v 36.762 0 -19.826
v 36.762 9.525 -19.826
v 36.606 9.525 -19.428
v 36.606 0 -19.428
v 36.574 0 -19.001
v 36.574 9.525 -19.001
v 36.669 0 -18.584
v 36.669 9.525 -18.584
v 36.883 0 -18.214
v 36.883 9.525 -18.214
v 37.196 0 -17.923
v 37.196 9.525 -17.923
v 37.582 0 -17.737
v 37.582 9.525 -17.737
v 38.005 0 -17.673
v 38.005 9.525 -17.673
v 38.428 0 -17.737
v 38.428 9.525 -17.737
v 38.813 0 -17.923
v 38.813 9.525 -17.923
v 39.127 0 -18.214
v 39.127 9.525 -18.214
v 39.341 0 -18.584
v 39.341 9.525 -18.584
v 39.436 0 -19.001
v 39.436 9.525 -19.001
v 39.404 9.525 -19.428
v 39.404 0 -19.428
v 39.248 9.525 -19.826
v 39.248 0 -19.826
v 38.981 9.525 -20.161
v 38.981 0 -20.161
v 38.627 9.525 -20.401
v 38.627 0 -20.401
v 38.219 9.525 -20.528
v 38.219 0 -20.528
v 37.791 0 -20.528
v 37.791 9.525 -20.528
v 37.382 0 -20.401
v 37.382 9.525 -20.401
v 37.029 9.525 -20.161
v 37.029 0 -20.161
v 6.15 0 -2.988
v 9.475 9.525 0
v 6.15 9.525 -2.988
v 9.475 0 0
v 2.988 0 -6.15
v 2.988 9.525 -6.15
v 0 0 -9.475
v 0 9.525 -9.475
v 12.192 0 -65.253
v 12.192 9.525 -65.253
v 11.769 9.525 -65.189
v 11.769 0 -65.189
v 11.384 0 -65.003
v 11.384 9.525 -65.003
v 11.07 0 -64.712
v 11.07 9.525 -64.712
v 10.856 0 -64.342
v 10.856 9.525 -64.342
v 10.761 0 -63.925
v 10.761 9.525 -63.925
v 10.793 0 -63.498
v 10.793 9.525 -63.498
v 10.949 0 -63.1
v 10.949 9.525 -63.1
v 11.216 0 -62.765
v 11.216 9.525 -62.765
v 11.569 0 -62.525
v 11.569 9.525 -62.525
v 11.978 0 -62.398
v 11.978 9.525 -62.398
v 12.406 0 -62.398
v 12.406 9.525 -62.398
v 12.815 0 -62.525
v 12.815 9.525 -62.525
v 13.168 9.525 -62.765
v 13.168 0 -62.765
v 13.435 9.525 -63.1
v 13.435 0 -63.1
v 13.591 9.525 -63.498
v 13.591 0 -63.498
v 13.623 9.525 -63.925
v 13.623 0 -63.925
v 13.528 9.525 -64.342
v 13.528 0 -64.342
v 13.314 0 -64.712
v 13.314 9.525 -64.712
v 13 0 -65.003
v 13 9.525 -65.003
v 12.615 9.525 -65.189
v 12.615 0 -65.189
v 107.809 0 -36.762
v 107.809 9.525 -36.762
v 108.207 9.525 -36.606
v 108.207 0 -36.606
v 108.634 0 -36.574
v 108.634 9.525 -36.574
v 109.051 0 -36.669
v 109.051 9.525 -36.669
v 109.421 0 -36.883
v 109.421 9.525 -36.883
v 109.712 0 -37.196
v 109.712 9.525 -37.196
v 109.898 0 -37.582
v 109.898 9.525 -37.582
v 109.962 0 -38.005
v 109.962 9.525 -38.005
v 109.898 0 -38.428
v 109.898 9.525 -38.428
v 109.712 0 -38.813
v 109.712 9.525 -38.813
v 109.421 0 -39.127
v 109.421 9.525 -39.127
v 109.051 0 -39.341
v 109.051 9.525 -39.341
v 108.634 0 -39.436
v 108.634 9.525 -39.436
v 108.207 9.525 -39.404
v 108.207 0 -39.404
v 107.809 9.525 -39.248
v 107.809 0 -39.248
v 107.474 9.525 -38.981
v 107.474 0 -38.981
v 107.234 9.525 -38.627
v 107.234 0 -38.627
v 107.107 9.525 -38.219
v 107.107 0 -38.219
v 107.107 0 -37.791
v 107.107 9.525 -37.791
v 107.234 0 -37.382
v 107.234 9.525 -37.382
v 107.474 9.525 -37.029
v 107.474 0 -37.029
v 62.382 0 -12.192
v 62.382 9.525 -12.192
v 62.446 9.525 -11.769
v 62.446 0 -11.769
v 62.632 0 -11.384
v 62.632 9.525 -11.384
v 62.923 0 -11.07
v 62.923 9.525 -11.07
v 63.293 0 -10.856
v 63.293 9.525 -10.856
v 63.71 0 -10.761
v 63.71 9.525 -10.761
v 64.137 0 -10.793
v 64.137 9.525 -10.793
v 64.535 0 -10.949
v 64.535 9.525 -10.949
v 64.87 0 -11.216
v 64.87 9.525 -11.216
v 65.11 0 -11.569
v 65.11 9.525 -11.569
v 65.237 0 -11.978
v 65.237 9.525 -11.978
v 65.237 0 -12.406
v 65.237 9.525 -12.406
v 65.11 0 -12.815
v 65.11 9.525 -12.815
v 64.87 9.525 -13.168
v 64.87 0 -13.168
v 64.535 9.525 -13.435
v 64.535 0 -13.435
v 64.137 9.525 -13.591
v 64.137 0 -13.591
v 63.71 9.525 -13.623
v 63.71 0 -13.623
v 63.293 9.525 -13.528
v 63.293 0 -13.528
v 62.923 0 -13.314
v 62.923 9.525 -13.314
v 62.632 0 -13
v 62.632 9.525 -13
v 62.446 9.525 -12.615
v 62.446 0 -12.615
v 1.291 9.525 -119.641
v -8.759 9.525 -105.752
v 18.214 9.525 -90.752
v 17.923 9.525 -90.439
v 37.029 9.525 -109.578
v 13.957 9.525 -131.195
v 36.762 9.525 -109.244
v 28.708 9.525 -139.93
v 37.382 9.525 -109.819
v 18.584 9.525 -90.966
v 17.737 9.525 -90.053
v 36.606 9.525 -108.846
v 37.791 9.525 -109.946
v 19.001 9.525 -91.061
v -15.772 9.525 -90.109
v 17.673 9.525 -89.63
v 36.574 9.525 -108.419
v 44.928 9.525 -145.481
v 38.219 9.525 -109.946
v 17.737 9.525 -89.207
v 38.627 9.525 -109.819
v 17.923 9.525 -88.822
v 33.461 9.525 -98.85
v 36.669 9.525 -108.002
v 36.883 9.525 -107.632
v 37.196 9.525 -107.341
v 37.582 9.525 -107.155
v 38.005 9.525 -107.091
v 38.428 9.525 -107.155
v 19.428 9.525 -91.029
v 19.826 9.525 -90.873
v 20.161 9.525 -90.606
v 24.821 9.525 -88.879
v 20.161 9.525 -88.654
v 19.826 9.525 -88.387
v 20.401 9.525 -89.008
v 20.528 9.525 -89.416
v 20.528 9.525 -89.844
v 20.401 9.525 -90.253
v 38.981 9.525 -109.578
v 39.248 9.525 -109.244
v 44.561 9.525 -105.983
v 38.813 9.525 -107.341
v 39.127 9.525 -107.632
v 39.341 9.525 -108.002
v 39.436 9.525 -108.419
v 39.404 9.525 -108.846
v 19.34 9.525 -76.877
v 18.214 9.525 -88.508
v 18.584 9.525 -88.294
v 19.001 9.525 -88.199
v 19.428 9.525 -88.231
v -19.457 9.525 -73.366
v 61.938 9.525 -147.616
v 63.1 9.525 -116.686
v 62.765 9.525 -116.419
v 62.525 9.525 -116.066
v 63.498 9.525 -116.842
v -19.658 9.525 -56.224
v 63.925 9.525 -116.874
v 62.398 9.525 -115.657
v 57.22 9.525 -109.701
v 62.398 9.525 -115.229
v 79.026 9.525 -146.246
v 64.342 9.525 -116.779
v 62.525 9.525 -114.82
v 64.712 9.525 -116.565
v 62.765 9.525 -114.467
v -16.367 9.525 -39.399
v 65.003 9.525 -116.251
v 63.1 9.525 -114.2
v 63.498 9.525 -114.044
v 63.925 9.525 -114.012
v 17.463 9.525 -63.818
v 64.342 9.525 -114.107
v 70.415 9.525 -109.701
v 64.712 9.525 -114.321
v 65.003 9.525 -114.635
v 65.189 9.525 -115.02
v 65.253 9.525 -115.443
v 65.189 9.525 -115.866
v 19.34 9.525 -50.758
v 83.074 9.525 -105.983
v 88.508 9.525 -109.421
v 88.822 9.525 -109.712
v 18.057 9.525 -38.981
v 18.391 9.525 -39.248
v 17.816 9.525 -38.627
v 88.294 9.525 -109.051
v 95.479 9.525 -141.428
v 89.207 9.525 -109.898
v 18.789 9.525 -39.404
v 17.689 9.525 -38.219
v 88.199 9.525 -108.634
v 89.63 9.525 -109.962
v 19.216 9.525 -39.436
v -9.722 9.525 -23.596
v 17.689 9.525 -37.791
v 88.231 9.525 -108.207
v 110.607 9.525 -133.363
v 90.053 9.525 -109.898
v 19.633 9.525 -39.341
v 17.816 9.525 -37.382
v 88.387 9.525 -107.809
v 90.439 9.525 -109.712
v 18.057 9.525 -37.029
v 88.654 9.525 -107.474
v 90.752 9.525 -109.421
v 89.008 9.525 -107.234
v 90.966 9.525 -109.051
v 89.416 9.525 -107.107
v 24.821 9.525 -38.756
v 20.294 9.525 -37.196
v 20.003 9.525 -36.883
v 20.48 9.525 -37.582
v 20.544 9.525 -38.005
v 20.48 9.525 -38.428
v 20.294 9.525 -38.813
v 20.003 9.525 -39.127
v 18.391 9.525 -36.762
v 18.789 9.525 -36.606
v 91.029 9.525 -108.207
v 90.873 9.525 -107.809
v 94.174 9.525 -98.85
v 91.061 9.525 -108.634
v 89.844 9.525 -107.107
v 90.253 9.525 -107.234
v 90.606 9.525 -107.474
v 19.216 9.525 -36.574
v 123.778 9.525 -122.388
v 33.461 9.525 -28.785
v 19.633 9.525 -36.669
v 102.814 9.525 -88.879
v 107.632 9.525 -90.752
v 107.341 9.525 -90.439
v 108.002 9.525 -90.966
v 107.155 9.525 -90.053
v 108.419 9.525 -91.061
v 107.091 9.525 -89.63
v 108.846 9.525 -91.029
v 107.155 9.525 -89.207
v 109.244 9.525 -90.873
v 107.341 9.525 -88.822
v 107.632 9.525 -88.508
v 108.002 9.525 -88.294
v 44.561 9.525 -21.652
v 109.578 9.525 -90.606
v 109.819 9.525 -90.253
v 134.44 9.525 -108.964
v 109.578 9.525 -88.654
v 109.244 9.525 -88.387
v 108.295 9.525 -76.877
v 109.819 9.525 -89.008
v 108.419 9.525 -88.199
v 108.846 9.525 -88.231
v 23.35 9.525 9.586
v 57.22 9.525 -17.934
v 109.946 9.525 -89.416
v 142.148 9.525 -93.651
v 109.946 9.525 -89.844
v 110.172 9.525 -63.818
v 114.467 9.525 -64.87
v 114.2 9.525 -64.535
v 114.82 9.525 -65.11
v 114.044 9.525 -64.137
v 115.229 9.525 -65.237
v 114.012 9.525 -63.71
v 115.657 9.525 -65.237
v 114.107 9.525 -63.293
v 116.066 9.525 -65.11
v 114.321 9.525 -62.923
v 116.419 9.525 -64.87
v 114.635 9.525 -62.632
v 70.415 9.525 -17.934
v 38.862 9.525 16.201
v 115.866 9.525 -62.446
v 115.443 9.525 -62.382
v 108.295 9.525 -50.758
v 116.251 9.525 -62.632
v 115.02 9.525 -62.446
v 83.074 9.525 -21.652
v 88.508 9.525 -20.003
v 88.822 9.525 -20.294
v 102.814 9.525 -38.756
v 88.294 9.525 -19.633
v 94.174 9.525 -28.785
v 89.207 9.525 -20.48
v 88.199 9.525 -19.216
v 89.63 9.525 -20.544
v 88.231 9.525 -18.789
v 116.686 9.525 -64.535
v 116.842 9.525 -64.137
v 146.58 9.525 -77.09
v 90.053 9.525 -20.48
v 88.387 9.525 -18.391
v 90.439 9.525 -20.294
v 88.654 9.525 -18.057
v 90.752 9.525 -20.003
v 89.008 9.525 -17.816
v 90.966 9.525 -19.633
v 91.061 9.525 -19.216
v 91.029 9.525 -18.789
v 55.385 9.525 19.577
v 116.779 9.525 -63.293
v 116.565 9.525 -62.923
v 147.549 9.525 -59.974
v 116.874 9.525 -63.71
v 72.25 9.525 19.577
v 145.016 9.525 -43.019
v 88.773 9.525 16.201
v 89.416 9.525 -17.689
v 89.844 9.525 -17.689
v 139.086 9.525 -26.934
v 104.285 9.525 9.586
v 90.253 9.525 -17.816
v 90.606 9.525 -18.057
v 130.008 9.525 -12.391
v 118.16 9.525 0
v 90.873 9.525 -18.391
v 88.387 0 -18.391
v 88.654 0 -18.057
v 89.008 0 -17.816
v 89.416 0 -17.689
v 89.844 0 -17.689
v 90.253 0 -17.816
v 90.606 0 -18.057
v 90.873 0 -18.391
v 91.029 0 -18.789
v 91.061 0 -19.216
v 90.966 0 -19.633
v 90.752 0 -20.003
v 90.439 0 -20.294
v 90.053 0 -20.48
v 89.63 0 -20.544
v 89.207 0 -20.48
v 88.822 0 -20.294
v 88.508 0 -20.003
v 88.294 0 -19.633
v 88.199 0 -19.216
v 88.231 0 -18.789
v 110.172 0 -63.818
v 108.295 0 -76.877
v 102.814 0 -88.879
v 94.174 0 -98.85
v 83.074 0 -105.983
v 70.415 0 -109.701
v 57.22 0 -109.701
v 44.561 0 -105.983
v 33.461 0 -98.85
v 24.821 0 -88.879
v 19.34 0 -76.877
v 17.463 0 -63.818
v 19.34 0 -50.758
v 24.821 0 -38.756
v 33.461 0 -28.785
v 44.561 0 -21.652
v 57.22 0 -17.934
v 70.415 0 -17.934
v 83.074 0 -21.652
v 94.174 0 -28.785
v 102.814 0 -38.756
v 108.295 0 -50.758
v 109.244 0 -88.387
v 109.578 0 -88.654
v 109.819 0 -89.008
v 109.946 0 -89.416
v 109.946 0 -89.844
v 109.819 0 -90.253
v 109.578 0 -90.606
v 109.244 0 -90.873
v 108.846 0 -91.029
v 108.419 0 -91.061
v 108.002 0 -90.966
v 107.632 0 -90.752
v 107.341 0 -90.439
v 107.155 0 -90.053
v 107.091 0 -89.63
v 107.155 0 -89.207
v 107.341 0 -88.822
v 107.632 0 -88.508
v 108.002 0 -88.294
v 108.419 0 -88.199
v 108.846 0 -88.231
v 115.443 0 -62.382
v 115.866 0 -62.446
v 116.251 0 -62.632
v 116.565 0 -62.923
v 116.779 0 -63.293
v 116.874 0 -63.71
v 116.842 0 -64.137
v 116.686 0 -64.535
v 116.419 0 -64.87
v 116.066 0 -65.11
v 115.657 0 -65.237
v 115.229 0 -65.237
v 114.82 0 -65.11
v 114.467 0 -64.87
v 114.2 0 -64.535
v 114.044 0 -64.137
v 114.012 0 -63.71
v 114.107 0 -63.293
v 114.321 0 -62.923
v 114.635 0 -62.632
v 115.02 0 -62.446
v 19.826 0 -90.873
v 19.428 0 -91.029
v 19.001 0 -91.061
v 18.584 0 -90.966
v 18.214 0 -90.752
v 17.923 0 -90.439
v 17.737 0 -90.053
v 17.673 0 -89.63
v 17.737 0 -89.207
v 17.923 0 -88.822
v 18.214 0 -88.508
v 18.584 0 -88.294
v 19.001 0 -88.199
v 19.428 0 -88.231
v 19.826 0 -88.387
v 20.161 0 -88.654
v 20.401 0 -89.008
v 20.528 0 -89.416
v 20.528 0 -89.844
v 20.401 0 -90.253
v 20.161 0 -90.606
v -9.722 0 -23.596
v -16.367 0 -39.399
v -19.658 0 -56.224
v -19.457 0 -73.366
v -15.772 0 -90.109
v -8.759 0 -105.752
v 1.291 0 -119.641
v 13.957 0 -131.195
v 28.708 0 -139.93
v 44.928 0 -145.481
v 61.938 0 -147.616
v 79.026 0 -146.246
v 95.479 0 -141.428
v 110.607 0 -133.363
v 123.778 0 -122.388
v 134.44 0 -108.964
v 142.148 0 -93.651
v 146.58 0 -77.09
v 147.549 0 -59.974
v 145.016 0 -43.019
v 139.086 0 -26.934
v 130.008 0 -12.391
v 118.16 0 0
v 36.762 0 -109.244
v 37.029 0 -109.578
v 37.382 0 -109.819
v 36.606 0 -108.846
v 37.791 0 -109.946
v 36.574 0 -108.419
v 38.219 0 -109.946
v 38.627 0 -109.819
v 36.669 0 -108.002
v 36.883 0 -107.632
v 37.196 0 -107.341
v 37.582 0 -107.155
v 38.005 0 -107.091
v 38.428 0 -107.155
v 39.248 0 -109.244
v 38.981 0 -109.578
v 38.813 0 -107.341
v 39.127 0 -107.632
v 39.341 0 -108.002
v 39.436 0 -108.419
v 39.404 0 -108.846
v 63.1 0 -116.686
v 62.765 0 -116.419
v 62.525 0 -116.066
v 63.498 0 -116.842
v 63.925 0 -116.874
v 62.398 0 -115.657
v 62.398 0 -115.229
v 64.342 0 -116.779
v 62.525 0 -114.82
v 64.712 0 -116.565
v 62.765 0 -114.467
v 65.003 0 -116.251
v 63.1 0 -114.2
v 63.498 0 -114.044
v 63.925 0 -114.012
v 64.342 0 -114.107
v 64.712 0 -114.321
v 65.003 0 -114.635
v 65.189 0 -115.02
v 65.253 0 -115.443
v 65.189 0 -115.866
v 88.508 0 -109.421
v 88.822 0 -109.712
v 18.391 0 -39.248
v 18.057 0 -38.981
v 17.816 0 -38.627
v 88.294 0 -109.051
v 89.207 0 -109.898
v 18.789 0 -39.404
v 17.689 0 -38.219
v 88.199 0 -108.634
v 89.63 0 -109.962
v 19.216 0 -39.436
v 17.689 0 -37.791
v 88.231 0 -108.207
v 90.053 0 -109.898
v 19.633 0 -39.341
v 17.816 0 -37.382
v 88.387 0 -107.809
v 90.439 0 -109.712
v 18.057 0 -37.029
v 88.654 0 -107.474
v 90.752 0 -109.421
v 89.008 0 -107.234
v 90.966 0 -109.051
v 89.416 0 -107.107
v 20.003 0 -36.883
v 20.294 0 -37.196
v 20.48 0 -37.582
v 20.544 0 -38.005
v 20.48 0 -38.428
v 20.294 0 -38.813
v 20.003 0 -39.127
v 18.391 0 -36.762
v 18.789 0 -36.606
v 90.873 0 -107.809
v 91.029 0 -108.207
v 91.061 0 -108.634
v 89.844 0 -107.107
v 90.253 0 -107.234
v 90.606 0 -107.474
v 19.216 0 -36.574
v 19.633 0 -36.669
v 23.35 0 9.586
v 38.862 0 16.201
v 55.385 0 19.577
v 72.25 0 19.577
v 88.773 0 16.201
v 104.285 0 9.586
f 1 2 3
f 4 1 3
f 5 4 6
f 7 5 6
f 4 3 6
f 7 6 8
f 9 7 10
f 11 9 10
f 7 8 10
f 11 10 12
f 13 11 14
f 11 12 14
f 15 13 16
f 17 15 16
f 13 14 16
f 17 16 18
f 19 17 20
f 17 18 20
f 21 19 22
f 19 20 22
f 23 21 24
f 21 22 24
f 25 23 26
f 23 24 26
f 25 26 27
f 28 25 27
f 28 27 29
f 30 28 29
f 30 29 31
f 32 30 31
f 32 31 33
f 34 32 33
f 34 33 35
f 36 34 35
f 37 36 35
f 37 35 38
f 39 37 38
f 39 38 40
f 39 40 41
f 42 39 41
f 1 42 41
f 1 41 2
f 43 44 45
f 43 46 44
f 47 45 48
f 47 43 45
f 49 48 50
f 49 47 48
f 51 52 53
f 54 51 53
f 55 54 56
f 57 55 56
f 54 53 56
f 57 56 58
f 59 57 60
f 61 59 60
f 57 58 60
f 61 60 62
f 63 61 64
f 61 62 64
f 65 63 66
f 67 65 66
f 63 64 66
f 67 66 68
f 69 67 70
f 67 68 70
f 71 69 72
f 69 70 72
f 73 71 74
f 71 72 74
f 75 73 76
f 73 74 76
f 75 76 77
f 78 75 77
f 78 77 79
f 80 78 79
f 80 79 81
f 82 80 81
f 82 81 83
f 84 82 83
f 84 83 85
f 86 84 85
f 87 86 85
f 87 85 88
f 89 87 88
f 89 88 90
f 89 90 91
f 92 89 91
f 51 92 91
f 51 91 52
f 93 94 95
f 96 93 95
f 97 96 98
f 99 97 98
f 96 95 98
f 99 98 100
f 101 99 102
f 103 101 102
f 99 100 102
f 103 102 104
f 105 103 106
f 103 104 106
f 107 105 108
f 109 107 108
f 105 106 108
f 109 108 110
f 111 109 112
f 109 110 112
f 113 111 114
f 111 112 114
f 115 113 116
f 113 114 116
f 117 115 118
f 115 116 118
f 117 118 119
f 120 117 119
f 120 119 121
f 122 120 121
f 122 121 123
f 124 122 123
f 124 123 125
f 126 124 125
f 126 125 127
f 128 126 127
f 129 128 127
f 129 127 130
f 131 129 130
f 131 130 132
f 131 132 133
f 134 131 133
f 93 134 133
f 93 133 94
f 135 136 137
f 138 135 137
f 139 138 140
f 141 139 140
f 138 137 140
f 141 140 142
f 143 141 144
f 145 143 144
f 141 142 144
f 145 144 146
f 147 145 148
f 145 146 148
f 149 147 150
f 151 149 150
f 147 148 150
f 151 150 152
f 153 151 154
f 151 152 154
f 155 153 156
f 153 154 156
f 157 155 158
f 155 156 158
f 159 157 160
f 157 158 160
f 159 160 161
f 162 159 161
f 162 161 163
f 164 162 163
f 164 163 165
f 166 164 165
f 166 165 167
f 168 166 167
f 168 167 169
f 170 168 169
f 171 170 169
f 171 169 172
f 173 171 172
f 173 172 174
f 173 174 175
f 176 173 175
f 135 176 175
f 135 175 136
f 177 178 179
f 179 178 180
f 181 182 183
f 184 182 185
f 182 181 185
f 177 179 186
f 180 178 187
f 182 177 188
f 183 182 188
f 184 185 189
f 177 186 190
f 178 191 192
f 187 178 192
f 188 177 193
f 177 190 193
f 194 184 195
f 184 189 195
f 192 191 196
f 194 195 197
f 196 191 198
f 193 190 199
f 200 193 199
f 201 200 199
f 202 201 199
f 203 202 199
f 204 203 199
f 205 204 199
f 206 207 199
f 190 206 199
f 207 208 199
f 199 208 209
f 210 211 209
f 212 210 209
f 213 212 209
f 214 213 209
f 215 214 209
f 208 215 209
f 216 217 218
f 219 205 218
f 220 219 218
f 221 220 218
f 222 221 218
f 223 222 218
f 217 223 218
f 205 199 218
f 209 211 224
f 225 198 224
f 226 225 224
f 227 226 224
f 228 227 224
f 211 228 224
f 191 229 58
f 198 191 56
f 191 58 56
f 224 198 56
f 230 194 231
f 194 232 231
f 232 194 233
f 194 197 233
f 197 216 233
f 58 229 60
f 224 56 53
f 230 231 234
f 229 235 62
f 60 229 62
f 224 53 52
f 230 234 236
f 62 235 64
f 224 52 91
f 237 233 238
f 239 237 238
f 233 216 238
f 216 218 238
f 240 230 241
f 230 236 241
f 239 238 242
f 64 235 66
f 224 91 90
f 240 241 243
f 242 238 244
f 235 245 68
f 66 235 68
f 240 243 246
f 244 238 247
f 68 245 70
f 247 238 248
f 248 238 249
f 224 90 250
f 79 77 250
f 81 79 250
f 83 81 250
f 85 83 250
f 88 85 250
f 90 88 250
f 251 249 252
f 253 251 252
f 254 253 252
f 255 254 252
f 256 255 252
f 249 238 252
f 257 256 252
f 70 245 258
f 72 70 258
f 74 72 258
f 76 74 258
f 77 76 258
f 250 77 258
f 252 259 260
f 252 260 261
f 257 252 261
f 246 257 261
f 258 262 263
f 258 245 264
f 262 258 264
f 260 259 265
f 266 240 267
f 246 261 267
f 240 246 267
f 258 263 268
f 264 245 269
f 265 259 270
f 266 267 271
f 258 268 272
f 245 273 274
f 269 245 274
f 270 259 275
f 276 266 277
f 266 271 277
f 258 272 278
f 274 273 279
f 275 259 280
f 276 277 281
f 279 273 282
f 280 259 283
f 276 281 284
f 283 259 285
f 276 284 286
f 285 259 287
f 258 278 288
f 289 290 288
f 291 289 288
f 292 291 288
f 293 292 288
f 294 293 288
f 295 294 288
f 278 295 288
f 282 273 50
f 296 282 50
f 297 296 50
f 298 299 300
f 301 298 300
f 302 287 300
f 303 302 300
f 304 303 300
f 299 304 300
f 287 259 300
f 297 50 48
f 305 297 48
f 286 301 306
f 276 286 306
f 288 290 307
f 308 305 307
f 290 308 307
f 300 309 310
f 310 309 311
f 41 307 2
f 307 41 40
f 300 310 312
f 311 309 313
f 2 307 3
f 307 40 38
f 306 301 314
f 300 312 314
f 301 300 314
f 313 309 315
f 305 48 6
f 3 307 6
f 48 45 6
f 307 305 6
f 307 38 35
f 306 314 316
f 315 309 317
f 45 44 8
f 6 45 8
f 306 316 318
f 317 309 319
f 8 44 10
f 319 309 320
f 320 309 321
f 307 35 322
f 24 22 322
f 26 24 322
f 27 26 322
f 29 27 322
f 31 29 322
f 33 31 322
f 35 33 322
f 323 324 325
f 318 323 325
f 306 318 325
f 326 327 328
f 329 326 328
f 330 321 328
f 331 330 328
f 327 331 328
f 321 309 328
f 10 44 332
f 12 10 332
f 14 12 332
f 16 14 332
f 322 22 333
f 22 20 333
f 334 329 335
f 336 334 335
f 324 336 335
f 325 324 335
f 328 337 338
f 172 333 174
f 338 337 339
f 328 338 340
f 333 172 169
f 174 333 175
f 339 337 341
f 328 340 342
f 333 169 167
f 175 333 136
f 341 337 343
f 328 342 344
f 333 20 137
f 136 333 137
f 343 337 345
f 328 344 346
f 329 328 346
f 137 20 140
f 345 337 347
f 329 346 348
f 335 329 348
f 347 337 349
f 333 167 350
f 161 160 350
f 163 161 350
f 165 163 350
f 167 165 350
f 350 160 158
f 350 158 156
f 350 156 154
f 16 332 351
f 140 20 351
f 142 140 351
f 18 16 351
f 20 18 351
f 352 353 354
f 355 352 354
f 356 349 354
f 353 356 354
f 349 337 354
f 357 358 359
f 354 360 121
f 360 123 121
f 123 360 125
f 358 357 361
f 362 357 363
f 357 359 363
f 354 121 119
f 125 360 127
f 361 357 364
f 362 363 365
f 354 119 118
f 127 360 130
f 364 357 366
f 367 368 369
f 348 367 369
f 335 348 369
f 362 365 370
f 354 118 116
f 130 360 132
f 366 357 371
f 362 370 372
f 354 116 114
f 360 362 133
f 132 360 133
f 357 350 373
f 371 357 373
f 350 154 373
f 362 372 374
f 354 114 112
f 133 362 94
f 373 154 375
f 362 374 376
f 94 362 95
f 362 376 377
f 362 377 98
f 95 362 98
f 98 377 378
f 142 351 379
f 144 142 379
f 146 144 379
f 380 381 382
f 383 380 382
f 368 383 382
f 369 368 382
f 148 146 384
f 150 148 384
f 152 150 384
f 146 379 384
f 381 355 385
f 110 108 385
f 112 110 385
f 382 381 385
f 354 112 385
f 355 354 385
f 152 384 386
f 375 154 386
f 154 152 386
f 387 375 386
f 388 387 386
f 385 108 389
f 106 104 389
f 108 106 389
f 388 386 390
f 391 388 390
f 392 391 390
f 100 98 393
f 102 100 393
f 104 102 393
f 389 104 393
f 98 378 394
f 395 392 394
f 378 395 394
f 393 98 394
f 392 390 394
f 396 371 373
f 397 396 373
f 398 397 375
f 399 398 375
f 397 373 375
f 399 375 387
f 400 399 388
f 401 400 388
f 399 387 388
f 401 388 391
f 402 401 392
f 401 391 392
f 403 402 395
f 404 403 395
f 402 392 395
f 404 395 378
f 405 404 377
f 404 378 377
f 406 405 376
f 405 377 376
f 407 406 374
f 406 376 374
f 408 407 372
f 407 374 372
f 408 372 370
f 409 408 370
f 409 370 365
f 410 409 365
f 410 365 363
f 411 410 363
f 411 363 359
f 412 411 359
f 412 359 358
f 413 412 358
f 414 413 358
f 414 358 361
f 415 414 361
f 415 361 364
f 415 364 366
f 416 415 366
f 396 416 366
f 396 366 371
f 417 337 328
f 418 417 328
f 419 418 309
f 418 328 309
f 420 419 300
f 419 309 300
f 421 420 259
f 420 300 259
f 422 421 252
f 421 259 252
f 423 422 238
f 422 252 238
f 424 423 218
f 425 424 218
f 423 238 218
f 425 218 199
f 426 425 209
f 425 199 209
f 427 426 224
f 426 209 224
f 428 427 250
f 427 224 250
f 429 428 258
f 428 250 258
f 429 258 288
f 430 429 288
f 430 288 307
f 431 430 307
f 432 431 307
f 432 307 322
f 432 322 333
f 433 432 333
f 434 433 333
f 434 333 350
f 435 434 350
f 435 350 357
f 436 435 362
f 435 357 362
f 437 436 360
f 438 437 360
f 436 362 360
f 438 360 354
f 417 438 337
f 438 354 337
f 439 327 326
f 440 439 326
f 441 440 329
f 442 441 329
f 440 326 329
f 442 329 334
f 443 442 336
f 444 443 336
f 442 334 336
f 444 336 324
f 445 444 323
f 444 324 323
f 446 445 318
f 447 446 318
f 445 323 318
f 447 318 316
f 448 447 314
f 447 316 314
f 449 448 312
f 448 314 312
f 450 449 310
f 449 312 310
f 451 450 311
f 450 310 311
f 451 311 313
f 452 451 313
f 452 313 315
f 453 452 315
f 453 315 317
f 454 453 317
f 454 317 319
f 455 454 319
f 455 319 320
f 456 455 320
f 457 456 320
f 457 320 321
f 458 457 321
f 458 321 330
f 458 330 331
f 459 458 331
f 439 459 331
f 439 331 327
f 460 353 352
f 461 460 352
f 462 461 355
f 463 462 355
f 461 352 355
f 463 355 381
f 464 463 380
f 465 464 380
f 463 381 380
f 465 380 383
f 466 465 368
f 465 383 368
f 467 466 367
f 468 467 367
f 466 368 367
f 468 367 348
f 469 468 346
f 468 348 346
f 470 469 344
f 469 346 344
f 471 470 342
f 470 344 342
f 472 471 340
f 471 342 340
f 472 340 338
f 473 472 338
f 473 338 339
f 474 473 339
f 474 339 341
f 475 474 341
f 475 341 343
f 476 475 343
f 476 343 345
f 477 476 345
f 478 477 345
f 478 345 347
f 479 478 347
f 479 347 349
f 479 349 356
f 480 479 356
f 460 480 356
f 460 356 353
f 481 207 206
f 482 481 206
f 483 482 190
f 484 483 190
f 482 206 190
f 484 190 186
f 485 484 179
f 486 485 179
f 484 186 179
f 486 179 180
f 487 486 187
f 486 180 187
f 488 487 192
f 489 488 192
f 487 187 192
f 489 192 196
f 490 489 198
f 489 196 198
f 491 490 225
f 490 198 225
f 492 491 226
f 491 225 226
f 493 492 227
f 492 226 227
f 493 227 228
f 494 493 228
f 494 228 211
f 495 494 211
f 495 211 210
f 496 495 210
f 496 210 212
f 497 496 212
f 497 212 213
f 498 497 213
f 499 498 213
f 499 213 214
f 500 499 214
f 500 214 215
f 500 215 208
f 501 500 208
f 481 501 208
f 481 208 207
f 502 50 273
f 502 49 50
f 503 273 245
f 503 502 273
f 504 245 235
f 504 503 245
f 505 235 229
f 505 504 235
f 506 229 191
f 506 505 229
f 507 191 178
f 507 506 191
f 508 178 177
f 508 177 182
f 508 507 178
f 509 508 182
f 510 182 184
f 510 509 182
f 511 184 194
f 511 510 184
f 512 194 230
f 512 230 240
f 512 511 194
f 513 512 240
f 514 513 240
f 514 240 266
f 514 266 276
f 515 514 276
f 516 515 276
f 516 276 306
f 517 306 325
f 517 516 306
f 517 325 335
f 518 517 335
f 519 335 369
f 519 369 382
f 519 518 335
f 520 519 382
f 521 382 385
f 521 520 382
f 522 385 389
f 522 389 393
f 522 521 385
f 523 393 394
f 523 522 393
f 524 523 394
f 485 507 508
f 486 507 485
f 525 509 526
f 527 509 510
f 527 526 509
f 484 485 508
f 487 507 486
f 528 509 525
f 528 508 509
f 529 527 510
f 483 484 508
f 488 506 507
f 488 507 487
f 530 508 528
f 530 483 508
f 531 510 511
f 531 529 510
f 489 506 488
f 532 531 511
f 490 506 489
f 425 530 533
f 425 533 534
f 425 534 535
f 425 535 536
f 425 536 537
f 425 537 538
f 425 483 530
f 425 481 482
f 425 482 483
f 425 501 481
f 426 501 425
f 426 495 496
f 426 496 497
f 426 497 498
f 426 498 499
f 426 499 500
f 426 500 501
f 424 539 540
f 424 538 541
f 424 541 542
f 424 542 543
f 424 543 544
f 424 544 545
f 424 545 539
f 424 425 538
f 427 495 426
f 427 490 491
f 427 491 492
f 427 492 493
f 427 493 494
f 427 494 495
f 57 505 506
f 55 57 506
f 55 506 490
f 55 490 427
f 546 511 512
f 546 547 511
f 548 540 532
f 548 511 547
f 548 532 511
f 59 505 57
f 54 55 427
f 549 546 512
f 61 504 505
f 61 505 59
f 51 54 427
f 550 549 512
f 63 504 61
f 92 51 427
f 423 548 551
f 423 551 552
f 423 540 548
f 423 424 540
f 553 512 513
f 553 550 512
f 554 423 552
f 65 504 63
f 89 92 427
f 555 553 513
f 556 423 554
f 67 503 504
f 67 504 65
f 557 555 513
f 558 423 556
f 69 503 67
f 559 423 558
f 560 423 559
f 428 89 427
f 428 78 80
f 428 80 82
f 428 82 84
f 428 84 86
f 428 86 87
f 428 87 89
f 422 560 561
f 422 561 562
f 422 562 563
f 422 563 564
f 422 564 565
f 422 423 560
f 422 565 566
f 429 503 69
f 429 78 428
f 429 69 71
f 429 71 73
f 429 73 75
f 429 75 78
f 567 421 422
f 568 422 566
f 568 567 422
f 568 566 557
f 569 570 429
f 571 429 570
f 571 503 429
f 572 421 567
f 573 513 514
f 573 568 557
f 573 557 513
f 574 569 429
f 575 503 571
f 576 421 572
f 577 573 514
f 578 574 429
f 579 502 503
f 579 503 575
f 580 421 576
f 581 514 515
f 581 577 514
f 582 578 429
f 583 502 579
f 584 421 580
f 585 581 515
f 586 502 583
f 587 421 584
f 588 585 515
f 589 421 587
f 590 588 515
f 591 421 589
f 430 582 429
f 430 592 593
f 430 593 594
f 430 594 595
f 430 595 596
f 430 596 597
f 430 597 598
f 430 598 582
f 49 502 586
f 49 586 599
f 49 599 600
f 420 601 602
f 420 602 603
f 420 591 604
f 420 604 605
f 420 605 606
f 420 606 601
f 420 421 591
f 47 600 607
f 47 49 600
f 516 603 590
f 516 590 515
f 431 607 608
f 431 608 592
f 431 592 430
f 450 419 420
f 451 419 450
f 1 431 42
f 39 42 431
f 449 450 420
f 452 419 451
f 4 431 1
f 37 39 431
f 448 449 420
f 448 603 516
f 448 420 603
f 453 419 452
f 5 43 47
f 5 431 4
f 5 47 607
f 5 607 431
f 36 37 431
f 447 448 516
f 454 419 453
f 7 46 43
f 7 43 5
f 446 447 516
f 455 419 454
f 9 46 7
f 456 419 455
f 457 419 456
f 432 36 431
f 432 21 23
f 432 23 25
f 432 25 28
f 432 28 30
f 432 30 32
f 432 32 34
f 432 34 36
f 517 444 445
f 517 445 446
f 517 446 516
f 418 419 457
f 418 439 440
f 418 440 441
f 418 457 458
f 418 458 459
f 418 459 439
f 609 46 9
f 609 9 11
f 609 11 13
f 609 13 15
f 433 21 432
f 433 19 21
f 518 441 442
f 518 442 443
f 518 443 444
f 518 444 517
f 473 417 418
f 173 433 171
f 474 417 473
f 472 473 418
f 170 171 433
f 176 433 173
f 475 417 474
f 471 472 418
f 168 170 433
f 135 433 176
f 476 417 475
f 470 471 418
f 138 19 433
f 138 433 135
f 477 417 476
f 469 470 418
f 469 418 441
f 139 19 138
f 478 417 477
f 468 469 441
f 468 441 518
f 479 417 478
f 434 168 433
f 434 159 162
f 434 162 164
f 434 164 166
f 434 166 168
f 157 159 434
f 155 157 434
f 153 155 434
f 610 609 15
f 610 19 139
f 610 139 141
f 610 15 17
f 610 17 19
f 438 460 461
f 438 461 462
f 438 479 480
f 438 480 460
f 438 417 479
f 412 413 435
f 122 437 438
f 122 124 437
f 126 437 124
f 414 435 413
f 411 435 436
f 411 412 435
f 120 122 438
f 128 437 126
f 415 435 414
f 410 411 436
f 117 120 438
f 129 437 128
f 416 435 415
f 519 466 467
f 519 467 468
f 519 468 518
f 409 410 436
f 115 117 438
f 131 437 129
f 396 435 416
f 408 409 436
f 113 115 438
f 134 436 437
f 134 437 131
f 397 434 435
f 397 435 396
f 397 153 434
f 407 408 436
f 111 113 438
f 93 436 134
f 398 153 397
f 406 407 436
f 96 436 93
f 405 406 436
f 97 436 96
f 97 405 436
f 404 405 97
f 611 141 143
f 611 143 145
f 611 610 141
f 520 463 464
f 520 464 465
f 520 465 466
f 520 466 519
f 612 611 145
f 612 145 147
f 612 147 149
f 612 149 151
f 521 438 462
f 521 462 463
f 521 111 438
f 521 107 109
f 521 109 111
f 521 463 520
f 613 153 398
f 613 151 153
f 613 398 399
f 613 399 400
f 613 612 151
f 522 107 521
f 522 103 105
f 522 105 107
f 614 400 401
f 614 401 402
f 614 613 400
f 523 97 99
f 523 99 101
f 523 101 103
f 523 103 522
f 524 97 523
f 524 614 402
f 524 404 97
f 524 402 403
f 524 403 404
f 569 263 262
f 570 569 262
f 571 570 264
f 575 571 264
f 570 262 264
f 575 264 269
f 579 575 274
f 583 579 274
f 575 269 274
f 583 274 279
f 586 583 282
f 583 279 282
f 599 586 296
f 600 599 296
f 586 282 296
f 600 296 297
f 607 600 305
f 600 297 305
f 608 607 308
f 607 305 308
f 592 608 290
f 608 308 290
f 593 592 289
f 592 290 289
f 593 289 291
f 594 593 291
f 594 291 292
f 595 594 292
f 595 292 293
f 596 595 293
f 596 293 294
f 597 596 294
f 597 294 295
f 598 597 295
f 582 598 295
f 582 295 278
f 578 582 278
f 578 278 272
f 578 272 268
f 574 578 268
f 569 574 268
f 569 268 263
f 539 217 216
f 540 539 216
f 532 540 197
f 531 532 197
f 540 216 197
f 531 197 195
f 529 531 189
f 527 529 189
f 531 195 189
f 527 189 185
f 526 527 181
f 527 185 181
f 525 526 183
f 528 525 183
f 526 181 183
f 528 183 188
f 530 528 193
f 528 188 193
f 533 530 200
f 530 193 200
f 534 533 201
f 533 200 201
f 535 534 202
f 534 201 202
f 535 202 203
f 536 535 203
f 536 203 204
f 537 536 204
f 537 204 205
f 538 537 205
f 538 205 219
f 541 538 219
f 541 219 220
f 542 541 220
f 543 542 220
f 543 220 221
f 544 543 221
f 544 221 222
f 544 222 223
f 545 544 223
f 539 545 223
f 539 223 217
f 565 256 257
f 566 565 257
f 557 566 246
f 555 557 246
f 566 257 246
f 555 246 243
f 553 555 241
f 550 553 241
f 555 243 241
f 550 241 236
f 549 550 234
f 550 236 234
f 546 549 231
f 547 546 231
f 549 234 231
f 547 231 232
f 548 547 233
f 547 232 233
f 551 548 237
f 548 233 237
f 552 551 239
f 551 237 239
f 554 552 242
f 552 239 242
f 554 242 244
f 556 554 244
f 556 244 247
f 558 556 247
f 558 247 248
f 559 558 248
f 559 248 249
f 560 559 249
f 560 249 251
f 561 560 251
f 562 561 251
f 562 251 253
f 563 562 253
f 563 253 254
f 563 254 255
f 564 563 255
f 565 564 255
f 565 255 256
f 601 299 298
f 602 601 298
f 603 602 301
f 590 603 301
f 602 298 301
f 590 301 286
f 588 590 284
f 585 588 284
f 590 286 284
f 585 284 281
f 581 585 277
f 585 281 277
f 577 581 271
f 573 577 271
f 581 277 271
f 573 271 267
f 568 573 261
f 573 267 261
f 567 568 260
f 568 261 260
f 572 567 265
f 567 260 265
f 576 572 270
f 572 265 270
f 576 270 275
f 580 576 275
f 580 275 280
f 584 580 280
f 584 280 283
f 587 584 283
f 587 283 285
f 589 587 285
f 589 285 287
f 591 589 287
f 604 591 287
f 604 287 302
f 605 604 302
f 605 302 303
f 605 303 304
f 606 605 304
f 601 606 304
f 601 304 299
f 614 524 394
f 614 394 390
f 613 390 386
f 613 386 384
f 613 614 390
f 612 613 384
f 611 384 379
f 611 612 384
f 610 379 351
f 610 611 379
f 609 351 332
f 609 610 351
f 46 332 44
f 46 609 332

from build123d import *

# Parameters (mm, degrees)
SKETCH1_W           = 127.635
SKETCH1_H           = 127.635
BOSS_EXTRUDE1_DEPTH = 9.525
SKETCH12_R          = 83.82
BOSS_EXTRUDE2_DEPTH = 9.525
SKETCH13_R          = 104.928492752
SKETCH13_R_2        = 83.82
CUT_EXTRUDE4_DEPTH  = 9.525
SKETCH5_R           = 46.355
CUT_EXTRUDE1_DEPTH  = 9.525
SKETCH11_R          = 1.4351
CUT_EXTRUDE3_DEPTH  = 10.525
CIRPATTERN1_COUNT   = 12


with BuildPart() as part:
    # Sketch1 → Boss-Extrude1 (new body)
    with BuildSketch(Plane(origin=(0, 0, 0), x_dir=(1, 0, 0), z_dir=(0, 1, 0))):
        with Locations((63.8175, 63.8175)):
            Rectangle(SKETCH1_W, SKETCH1_H)
    extrude(amount=BOSS_EXTRUDE1_DEPTH)

    # Sketch12 → Boss-Extrude2 (add)
    with BuildSketch(Plane.XZ):
        with Locations((63.8175, -63.8175)):
            Circle(SKETCH12_R)
    extrude(amount=-BOSS_EXTRUDE2_DEPTH)

    # Sketch13 → Cut-Extrude4 (cut)
    with BuildSketch(Plane(origin=(0, 0, 0), x_dir=(-1, 0, 0), z_dir=(0, -1, 0))):
        with Locations((-63.8175, 63.8175)):
            Circle(SKETCH13_R)
        with Locations((-63.8175, 63.8175)):
            Circle(SKETCH13_R_2, mode=Mode.SUBTRACT)
    extrude(amount=-CUT_EXTRUDE4_DEPTH, mode=Mode.SUBTRACT)

    # Sketch5 → Cut-Extrude1 (cut)
    with BuildSketch(Plane(origin=(0, 9.525, 0), x_dir=(1, 0, 0), z_dir=(0, 1, 0))):
        with Locations((63.8175, 63.8175)):
            Circle(SKETCH5_R)
    extrude(amount=-CUT_EXTRUDE1_DEPTH, mode=Mode.SUBTRACT)

    # Sketch11 → Cut-Extrude3 (cut, through all)
    with BuildSketch(Plane(origin=(0, 9.525, 0), x_dir=(1, 0, 0), z_dir=(0, 1, 0))):
        with Locations((63.8175, 115.443)):
            Circle(SKETCH11_R)
    cut_extrude3 = extrude(amount=-CUT_EXTRUDE3_DEPTH, mode=Mode.SUBTRACT)

    # CirPattern1: Cut-Extrude3 ×12 about axis
    cirpattern1_axis = Axis((63.8175, 0, -63.8175), (0, 1, 0))
    for i in range(1, CIRPATTERN1_COUNT):
        add(cut_extrude3.rotate(cirpattern1_axis, i * 360 / CIRPATTERN1_COUNT), mode=Mode.SUBTRACT)


solid = part.part
